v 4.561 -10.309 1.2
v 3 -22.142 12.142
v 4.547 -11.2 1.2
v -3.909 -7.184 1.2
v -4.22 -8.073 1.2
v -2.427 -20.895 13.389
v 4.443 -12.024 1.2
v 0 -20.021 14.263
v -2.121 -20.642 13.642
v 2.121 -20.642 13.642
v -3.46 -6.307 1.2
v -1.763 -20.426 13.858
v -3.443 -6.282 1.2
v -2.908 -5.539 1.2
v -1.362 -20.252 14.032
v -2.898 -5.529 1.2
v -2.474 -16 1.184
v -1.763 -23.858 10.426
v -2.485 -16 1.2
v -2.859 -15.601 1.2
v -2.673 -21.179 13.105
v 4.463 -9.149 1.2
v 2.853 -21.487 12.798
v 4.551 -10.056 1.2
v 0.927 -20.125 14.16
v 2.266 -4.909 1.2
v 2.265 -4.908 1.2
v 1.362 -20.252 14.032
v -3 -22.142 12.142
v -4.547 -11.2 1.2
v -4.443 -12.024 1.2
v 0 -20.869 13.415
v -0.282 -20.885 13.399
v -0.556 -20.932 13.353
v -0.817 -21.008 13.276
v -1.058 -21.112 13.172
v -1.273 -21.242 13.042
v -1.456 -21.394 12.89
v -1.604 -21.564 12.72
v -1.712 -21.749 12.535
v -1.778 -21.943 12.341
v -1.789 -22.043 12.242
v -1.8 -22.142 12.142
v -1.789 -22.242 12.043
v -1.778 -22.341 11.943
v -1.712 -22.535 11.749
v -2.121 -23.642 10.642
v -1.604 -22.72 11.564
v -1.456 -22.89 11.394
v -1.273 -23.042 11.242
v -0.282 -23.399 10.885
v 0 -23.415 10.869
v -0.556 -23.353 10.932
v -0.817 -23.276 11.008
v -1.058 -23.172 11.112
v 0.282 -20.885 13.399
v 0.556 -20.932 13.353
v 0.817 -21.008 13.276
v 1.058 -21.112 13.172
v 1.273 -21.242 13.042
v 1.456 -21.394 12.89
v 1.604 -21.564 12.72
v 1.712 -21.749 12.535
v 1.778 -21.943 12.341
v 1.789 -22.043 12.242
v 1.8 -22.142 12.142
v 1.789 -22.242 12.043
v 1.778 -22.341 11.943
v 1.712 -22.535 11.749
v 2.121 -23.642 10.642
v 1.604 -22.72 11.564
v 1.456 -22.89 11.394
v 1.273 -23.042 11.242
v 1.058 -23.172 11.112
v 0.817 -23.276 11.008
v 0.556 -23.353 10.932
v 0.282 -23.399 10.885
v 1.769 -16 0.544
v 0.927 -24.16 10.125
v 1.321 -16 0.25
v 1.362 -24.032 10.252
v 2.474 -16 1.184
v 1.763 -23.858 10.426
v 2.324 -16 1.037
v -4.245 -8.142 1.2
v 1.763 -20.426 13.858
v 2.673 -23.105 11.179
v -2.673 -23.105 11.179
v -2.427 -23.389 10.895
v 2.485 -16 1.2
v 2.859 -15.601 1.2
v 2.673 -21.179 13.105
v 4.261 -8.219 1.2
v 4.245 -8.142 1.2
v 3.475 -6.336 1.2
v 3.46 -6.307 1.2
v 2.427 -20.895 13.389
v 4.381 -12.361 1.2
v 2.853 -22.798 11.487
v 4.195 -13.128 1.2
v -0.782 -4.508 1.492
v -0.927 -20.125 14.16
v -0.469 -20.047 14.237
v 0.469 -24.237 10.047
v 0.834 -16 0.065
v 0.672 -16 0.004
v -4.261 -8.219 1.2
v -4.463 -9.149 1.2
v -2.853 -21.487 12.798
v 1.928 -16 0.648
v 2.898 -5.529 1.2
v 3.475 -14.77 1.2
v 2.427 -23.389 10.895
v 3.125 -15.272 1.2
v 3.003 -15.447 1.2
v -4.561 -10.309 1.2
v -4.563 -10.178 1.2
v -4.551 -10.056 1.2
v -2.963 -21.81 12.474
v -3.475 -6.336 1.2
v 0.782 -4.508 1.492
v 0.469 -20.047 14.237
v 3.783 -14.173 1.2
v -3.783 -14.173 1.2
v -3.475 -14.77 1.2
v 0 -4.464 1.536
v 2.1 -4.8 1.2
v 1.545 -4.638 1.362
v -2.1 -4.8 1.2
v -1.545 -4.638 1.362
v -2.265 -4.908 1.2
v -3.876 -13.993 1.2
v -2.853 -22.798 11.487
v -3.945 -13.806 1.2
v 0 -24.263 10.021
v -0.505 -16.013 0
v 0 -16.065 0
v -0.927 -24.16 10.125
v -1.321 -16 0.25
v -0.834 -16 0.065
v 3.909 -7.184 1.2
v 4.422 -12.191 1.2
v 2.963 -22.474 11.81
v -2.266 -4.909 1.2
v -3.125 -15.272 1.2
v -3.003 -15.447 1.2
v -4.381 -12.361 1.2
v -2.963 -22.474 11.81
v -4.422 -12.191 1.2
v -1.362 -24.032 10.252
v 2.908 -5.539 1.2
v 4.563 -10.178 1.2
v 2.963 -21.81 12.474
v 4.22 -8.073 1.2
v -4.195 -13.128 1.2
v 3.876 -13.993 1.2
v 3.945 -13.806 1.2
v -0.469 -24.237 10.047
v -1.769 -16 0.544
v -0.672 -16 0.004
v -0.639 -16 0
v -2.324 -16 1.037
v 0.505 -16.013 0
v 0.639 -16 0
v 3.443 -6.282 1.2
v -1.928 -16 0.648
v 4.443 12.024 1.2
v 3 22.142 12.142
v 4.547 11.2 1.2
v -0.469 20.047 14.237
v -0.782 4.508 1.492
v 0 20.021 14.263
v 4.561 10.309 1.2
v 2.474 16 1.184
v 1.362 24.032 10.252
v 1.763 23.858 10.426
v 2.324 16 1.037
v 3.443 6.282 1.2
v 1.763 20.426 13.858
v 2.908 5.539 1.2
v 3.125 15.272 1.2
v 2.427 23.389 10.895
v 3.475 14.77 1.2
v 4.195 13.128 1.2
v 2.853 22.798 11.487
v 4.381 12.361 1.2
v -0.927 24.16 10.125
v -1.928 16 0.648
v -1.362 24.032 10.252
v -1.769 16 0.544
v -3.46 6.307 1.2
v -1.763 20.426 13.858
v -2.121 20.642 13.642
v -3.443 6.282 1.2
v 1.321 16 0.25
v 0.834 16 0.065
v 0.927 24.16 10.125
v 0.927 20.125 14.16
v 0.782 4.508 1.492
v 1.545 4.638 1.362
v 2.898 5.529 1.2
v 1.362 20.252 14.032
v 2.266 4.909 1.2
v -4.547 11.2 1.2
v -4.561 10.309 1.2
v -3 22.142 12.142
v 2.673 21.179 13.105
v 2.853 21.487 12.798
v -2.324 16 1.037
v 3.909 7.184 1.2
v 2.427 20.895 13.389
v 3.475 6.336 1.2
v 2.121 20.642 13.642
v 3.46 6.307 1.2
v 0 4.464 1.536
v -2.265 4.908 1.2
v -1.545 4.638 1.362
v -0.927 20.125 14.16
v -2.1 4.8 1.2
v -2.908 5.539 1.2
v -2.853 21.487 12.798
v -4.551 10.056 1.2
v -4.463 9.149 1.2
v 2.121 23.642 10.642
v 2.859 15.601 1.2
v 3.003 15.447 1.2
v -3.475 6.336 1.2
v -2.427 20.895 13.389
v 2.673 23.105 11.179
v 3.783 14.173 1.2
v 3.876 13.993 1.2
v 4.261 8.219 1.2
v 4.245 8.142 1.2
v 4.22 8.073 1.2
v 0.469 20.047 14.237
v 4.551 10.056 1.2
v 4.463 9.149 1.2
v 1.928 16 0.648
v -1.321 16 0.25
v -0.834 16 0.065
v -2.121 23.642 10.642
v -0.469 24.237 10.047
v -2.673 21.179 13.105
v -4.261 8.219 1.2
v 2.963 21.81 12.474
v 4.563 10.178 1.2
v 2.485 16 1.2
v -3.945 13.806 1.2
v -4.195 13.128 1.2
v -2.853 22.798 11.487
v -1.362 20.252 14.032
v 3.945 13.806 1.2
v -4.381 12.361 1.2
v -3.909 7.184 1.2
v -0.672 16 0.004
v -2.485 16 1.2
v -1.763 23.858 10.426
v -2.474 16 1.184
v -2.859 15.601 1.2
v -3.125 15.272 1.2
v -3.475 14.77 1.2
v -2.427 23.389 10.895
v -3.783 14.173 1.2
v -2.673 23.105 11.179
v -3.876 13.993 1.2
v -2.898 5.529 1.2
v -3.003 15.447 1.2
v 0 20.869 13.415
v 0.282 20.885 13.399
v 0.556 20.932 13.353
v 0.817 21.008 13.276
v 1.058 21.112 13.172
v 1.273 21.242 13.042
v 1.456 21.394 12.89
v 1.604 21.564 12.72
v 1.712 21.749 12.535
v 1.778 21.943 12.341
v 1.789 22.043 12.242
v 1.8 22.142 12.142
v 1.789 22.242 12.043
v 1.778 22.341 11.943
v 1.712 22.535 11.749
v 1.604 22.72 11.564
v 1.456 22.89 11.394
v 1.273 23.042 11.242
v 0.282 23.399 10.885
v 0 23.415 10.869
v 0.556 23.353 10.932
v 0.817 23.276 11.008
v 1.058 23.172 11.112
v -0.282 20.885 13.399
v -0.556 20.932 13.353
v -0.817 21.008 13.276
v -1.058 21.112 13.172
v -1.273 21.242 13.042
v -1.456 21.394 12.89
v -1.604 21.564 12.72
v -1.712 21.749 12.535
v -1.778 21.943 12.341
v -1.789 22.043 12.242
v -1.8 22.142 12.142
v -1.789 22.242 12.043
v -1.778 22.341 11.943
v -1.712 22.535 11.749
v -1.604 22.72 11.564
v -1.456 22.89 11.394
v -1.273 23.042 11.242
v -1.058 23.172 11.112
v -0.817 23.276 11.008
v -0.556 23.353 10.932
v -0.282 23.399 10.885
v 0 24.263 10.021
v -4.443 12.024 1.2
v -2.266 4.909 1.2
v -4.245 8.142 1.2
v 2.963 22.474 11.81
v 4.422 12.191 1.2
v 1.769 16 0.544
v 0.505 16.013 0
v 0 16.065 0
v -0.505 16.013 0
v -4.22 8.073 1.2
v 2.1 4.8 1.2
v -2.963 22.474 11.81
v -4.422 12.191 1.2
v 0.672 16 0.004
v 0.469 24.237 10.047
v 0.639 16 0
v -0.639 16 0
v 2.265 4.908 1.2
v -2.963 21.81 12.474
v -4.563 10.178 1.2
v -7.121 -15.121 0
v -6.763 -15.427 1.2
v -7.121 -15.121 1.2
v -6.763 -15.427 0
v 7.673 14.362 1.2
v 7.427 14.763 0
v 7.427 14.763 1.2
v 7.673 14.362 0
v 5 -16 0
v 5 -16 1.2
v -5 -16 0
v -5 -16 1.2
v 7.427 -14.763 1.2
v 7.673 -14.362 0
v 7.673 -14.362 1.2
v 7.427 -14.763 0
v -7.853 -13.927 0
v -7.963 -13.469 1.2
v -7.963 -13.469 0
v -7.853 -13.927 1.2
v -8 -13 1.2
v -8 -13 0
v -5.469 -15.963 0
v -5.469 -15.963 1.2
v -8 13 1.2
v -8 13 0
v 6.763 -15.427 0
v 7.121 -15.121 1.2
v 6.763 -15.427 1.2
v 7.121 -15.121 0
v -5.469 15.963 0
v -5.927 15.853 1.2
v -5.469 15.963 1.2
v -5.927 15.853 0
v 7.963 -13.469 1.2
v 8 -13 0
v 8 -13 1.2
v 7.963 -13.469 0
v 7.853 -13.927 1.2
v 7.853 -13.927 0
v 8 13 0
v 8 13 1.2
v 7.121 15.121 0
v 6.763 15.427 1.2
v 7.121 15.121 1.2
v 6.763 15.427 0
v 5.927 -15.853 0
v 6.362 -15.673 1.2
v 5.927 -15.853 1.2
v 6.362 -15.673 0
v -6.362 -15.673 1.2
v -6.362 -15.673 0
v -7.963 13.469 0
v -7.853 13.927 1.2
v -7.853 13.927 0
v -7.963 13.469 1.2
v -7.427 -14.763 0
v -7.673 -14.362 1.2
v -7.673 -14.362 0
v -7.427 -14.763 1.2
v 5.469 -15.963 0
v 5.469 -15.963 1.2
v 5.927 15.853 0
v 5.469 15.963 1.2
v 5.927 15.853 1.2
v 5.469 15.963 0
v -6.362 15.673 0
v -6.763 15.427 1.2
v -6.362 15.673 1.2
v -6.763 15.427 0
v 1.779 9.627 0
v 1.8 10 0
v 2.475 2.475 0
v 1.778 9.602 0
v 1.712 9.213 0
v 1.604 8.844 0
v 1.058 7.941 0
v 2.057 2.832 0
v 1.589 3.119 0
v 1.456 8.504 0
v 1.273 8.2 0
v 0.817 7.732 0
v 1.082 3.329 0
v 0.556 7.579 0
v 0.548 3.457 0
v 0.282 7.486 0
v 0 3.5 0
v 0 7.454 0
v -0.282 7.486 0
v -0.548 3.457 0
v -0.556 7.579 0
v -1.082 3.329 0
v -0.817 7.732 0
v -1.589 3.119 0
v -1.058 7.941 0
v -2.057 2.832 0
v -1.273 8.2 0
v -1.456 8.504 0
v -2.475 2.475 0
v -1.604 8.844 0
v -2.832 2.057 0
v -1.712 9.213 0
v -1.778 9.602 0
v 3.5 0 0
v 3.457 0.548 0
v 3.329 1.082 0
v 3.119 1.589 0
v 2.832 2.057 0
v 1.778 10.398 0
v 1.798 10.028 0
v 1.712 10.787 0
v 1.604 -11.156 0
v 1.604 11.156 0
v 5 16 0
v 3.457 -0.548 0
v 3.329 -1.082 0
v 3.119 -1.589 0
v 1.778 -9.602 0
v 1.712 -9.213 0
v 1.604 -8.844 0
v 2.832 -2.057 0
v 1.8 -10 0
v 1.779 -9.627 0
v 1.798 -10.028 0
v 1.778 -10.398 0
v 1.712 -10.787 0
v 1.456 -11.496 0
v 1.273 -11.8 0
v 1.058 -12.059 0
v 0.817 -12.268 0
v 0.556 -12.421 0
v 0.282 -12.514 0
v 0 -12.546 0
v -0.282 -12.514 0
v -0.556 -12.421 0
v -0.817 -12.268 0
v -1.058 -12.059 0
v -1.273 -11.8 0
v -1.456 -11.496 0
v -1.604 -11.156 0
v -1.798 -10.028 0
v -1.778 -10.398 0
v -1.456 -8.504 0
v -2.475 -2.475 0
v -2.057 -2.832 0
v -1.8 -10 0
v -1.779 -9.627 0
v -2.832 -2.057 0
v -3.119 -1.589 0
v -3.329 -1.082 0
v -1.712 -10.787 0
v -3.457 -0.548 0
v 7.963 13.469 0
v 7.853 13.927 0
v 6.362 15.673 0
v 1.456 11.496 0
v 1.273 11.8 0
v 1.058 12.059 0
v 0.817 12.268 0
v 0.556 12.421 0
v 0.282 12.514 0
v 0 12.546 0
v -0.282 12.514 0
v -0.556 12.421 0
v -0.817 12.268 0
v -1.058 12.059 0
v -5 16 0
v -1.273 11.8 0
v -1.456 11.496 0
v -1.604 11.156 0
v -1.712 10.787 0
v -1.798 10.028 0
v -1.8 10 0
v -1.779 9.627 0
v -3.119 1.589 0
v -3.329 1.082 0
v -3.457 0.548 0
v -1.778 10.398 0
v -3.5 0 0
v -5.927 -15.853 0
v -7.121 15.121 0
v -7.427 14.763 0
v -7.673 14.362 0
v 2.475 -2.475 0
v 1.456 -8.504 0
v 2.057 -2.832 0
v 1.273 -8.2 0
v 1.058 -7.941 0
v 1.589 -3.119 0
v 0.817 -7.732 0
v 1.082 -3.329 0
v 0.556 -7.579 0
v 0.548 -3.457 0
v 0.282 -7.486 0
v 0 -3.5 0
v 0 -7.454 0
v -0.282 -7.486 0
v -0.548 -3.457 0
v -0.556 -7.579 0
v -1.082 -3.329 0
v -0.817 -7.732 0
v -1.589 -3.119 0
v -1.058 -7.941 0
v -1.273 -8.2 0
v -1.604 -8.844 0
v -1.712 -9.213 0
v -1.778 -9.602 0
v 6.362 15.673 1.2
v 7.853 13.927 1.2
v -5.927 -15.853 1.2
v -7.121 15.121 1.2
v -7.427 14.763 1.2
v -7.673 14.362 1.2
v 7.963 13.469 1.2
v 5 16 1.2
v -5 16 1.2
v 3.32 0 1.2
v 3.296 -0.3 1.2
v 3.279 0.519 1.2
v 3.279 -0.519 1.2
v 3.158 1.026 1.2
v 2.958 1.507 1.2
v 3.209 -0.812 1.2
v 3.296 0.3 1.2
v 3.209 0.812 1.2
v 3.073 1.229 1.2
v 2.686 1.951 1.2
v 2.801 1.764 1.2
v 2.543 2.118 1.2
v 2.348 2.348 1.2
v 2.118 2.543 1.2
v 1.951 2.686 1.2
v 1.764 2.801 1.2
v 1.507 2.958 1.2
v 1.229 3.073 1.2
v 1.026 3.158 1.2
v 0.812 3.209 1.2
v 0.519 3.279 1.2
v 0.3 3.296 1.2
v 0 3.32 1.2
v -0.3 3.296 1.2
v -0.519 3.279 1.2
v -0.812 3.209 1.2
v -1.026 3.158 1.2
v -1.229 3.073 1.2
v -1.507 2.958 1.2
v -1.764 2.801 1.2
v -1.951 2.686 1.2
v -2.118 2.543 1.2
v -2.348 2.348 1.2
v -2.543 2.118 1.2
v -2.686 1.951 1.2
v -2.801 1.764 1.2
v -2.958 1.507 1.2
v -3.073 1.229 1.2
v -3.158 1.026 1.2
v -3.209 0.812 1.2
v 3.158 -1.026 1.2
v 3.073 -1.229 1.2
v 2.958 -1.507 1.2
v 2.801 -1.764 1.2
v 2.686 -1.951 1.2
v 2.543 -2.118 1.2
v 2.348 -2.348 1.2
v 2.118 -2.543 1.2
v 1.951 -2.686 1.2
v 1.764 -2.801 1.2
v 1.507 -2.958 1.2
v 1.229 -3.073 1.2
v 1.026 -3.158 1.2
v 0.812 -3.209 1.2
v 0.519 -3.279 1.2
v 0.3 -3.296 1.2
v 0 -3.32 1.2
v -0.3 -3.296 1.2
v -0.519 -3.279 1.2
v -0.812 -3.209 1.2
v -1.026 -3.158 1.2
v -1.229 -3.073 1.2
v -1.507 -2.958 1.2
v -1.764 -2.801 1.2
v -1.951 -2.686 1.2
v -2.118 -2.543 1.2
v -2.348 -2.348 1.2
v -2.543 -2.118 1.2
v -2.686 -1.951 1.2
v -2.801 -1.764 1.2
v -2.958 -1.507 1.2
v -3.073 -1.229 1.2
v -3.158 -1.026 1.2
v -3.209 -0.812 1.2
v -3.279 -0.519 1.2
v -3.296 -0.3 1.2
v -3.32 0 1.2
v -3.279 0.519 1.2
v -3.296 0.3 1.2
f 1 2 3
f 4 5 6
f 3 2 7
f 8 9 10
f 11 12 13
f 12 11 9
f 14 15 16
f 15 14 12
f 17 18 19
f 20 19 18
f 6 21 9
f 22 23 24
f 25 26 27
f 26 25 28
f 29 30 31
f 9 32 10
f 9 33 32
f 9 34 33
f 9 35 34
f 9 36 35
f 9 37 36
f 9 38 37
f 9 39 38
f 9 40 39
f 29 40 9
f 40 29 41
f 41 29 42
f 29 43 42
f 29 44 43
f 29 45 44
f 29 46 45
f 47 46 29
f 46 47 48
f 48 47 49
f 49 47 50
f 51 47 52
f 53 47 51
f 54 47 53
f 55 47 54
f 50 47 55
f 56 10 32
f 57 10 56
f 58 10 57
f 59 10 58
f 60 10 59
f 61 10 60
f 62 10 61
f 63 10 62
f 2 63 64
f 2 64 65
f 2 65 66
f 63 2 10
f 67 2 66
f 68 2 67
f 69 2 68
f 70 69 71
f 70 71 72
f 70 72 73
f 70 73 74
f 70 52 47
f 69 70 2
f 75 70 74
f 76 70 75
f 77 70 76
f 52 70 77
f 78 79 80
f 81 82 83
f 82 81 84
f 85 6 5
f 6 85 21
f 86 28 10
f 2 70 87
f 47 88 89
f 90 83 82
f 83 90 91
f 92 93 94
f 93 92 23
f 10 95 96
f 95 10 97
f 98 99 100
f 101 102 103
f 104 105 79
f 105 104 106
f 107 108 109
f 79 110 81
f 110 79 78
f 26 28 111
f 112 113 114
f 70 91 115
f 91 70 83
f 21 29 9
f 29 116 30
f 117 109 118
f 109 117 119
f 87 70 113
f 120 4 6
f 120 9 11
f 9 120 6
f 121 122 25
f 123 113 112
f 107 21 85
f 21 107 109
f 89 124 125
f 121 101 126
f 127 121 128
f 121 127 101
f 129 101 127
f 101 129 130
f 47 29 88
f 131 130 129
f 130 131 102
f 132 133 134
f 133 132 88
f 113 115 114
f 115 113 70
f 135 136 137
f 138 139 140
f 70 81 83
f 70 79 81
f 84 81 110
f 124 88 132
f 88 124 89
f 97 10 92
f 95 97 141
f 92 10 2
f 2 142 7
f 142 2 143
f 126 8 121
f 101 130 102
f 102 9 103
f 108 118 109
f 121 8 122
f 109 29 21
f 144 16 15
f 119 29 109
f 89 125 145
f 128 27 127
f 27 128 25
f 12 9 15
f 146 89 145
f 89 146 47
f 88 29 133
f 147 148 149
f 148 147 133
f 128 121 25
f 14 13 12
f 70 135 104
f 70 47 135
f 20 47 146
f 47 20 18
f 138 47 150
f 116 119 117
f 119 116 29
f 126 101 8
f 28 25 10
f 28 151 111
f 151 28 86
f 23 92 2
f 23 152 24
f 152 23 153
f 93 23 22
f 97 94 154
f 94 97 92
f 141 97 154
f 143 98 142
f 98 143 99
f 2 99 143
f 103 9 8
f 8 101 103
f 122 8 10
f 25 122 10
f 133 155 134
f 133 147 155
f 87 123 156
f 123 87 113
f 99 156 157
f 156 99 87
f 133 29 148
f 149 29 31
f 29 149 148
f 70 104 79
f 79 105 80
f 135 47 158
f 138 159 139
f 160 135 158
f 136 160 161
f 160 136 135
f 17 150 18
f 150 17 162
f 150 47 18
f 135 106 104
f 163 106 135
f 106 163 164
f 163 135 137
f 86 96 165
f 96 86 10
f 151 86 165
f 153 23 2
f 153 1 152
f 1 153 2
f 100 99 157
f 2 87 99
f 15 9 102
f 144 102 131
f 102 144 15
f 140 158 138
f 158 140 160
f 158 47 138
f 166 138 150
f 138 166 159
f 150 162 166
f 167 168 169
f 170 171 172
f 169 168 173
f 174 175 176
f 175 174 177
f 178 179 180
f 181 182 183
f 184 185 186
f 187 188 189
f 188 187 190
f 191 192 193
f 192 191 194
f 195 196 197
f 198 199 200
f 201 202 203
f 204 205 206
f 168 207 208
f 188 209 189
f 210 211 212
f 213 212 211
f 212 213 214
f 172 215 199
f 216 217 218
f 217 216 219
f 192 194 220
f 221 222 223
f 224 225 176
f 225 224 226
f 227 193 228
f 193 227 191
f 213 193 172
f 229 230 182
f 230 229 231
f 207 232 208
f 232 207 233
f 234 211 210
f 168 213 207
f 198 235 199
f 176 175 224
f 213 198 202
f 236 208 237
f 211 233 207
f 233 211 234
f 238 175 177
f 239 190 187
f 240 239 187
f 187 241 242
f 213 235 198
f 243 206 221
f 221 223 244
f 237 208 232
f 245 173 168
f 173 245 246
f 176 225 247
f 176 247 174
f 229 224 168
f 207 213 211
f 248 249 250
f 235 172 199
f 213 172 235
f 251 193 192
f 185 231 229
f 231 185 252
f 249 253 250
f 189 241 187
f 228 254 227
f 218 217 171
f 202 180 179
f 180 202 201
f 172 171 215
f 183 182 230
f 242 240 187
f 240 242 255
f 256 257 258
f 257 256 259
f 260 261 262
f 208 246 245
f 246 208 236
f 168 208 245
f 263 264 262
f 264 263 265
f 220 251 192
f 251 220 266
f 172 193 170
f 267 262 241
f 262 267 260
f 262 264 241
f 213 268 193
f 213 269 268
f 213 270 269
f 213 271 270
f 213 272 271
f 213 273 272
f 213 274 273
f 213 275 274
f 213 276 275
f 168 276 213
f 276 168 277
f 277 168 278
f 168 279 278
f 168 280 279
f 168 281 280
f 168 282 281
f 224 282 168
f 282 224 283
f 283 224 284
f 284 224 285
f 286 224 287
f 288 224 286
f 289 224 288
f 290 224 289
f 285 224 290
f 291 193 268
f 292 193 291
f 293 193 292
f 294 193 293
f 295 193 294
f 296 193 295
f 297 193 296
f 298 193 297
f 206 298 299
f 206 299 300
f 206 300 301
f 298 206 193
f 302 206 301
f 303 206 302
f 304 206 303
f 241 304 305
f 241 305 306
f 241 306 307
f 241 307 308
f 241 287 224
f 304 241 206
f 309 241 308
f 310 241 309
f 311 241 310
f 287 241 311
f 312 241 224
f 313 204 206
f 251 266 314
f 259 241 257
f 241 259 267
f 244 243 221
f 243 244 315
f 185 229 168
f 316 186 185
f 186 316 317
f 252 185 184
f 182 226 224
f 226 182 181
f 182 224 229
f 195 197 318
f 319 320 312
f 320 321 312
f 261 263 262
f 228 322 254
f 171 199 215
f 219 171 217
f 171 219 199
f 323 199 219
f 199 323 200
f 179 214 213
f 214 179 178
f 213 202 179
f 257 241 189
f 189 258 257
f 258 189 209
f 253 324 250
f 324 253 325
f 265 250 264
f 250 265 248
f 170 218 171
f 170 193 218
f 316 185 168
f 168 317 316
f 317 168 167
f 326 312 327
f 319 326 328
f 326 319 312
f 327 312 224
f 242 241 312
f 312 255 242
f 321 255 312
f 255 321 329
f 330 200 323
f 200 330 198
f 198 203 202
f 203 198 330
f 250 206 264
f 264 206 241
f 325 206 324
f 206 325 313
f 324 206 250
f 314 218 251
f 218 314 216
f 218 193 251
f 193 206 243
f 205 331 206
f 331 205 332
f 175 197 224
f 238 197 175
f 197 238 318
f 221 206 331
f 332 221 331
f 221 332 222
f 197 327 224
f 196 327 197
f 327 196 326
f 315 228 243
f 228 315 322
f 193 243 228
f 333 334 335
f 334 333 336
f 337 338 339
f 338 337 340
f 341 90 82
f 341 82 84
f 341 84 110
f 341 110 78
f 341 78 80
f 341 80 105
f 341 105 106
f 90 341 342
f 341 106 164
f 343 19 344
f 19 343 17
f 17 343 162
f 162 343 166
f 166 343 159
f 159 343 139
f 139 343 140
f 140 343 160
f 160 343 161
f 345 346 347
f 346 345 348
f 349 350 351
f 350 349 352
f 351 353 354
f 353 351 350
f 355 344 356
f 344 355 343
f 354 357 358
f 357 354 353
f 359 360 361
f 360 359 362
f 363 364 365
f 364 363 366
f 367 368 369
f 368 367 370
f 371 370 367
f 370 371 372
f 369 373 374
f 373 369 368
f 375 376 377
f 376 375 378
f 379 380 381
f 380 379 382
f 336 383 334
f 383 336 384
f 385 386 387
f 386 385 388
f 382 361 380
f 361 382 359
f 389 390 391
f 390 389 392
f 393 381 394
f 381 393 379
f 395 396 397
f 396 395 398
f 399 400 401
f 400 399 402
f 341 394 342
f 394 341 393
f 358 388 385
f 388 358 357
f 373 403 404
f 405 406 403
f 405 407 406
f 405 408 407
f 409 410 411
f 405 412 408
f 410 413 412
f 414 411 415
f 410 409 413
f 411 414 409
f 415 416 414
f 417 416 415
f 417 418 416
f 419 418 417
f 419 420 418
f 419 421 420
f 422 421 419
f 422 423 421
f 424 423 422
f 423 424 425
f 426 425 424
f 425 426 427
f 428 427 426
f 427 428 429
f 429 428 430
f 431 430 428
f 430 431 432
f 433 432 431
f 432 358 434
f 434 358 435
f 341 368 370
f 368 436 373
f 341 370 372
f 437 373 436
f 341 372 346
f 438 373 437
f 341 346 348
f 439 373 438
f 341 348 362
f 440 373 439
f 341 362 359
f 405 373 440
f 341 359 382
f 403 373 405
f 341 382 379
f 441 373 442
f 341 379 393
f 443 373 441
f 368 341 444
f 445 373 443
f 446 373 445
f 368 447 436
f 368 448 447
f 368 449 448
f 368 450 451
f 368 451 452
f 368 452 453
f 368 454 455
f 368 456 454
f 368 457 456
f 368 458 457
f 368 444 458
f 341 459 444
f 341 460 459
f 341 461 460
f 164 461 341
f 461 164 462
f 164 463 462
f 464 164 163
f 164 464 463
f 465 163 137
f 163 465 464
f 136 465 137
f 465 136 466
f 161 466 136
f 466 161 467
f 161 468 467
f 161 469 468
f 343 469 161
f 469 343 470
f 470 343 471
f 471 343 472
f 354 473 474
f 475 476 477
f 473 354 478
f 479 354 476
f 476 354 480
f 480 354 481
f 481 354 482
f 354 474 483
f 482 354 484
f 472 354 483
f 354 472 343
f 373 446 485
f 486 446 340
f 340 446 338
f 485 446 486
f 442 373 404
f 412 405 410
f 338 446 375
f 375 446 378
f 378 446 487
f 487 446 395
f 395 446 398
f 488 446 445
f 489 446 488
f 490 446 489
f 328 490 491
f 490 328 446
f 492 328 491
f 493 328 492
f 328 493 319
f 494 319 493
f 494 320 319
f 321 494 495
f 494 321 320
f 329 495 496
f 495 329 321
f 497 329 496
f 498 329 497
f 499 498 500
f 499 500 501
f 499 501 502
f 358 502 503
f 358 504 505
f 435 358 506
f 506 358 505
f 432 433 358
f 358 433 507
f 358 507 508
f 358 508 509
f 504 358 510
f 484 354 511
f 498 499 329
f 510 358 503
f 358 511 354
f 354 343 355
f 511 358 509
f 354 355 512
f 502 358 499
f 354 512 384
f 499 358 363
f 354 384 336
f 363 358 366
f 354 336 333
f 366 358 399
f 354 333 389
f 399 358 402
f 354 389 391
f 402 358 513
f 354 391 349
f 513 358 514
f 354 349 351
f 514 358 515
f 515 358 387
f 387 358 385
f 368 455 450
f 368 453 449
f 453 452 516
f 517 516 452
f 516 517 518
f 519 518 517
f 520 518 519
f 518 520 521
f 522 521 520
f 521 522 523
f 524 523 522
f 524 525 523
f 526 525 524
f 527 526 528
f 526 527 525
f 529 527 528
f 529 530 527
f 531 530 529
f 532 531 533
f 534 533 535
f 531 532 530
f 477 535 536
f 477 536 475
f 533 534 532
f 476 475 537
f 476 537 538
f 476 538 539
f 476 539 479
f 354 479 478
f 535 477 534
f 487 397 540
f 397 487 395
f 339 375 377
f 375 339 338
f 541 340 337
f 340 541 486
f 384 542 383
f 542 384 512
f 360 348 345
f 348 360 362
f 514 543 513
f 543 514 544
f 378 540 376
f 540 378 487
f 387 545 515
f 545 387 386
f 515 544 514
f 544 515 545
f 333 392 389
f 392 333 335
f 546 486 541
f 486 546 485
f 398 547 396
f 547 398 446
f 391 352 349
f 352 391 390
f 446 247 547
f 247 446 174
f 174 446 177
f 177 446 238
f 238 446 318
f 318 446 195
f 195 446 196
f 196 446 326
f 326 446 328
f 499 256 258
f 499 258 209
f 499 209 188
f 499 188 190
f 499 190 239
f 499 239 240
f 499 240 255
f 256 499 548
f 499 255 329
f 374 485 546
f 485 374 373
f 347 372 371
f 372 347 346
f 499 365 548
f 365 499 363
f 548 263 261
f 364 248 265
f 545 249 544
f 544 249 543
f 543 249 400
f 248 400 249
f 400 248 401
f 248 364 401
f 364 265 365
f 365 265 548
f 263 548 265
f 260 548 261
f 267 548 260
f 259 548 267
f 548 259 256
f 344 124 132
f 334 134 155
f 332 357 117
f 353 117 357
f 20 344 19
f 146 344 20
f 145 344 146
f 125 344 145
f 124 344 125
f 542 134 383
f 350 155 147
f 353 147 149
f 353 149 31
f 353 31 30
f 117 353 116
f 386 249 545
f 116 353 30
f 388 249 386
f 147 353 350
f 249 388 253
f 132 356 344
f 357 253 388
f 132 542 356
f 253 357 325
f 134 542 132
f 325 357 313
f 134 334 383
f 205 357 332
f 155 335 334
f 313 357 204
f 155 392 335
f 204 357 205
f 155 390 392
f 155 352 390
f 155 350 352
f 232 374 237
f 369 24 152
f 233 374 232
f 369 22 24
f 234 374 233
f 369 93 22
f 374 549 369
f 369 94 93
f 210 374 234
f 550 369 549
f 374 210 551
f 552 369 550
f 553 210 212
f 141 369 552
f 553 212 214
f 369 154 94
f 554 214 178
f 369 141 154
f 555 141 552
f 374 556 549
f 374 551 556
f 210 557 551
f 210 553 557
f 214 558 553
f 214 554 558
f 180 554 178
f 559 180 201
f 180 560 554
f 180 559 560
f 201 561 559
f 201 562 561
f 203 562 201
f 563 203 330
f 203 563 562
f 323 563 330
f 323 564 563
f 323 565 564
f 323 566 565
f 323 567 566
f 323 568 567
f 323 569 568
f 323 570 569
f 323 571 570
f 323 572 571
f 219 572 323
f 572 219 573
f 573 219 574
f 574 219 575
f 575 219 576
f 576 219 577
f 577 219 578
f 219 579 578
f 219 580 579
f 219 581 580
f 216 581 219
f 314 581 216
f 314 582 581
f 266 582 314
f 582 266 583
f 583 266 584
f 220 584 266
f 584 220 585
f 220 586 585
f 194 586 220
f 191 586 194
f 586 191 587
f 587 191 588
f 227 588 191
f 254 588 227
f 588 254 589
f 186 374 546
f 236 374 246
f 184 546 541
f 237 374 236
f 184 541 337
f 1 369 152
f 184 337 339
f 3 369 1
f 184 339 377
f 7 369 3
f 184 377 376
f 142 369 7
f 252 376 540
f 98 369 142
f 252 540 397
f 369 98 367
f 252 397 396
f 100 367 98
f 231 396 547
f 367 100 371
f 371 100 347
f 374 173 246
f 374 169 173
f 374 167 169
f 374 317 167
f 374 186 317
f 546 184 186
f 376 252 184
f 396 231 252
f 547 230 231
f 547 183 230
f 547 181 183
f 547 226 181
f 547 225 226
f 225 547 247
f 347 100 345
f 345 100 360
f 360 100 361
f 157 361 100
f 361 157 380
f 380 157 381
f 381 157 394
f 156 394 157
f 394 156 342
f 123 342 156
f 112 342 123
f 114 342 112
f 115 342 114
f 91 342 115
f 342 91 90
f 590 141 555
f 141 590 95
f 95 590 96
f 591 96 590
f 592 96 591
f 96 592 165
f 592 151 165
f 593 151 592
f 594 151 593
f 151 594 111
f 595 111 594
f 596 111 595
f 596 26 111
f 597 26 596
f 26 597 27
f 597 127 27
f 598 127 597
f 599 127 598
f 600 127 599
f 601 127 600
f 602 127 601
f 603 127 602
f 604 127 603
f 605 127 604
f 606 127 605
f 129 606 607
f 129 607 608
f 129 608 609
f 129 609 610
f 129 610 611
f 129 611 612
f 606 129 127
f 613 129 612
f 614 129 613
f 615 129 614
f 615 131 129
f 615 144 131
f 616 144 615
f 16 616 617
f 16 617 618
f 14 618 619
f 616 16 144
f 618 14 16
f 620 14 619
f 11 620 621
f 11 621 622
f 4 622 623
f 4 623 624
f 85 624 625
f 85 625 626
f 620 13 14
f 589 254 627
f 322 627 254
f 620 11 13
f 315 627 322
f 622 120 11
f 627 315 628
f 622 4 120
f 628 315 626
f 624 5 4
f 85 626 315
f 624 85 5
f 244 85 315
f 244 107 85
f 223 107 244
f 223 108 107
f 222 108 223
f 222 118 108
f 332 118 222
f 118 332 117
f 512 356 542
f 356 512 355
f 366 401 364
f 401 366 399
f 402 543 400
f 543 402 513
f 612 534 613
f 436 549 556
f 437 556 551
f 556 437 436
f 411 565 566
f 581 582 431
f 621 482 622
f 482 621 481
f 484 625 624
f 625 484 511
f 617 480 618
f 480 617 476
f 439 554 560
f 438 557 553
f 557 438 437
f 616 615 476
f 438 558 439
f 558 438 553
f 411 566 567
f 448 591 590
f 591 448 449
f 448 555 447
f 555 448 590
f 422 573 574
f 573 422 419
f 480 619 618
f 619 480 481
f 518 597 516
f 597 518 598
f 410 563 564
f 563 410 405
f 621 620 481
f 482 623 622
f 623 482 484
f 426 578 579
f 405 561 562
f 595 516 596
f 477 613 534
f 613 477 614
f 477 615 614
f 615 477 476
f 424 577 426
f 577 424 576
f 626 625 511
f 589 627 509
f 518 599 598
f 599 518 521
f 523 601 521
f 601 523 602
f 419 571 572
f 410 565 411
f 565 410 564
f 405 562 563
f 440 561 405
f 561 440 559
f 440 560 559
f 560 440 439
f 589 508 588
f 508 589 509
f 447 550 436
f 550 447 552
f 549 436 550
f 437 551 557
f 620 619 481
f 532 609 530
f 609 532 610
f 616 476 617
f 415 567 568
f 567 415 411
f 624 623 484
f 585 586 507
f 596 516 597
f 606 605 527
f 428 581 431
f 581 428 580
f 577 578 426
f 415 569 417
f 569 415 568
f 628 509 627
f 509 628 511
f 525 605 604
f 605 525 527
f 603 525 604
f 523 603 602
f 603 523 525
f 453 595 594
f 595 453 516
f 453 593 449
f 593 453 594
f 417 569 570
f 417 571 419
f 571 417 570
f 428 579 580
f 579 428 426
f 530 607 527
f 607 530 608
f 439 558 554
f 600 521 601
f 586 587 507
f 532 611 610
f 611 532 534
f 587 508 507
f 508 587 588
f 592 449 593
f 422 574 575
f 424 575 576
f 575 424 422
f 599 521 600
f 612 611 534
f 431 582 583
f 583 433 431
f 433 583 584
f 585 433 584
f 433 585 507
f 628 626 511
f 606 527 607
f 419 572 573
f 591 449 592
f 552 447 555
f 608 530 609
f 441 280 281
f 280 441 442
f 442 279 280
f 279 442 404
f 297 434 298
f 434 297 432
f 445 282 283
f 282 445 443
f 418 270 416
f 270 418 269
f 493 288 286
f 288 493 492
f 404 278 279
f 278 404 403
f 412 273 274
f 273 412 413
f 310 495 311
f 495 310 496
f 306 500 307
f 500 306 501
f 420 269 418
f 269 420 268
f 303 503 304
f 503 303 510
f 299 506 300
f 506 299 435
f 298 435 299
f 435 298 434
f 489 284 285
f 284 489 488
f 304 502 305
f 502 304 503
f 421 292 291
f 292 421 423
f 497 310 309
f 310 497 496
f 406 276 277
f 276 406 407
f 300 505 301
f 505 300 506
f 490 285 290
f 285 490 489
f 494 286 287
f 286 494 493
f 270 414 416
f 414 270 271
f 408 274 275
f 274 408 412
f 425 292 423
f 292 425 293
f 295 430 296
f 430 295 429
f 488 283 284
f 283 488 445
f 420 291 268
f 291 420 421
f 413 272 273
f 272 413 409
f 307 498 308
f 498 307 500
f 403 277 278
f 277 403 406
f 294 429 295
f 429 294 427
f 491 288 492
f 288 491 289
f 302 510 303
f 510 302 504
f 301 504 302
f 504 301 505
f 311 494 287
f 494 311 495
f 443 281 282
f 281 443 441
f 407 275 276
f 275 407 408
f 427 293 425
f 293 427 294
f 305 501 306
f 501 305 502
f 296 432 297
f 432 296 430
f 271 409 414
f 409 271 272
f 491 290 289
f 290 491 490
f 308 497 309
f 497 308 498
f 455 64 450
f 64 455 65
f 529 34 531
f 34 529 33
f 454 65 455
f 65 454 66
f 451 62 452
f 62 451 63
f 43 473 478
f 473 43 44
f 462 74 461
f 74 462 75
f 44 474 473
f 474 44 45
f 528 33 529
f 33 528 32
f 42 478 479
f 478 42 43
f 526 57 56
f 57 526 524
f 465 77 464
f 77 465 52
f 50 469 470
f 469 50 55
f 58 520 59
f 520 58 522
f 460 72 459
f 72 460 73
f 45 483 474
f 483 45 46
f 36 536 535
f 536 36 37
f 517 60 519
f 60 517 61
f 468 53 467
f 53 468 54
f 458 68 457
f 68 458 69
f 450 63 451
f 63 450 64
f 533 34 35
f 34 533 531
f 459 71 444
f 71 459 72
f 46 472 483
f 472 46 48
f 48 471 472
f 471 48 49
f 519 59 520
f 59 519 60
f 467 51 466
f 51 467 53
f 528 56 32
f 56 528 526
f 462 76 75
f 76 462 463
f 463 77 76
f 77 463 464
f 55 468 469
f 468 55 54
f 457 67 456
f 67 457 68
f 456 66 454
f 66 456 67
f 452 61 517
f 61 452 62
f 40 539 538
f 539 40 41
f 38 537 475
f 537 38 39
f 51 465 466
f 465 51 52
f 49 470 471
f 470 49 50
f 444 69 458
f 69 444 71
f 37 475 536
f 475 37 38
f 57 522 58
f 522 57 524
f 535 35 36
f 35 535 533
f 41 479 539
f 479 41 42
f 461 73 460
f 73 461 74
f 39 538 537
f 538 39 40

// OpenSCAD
/*
Antenna holder for Armattan F1-5 (c) by Jorge Monteiro

Antenna holder for Armattan F1-5 is licensed under a
Creative Commons Attribution-ShareAlike 4.0 International.

You should have received a copy of the license along with this
work.  If not, see <http://creativecommons.org/licenses/by-sa/4.0/>.
*/


$fn = 40*1;
/* [Basics] */
// Length of the antena tube
antennaLength = 20;
// Outer diameter of the antena tube
antennaOuter = 3;
// Inner diameter of the antena tube
antennaInner = 1.8;
// Thickness of the base
baseThickness = 1.2;
// Width of the base
width=16;

difference() {
    union() {
        roundedCube(width, 32, baseThickness, 3);

        translate([0, 0, -5]) 
            union() {
                // Now draw the antenna tubes
                translate([0,-8,3]){
                    rotate([45, 0, 0]){
                        cylinder(antennaLength, antennaOuter+2, antennaOuter);
                    };
                };
                translate([0,8,3]){
                    rotate([-45, 0, 0]){
                        cylinder(antennaLength, antennaOuter+2, antennaOuter);
                    };
                };
            };
        };
        translate([0, 0, -5]) cube([100,100,10], true);
        cylinder(2, 3.5, 3.2);
        translate([0,8,-2])
            rotate([-45, 0, 0])
                cylinder(antennaLength*2, antennaInner, antennaInner);
        translate([0,-8,-2])
            rotate([45, 0, 0])
                cylinder(antennaLength*2, antennaInner, antennaInner);
        
        
    };

module drawTube(distance, outer, inner) {
    difference() {
        cylinder(distance, outer, outer);
        cylinder(distance, inner, inner);
    };
};

//roundedCube(36,36,1.2,3);
module roundedCube(xdim, ydim, zdim, rdim) {
    translate([-xdim/2,-ydim/2,0]){
        hull(){
            translate([rdim,rdim,0]) cylinder(r=rdim, h=zdim);
            translate([xdim-rdim,rdim,0]) cylinder(r=rdim, h=zdim);

            translate([rdim,ydim-rdim,0]) cylinder(r=rdim, h=zdim);
            translate([xdim-rdim,ydim-rdim,0]) cylinder(r=rdim, h=zdim);

        };
    };
};
